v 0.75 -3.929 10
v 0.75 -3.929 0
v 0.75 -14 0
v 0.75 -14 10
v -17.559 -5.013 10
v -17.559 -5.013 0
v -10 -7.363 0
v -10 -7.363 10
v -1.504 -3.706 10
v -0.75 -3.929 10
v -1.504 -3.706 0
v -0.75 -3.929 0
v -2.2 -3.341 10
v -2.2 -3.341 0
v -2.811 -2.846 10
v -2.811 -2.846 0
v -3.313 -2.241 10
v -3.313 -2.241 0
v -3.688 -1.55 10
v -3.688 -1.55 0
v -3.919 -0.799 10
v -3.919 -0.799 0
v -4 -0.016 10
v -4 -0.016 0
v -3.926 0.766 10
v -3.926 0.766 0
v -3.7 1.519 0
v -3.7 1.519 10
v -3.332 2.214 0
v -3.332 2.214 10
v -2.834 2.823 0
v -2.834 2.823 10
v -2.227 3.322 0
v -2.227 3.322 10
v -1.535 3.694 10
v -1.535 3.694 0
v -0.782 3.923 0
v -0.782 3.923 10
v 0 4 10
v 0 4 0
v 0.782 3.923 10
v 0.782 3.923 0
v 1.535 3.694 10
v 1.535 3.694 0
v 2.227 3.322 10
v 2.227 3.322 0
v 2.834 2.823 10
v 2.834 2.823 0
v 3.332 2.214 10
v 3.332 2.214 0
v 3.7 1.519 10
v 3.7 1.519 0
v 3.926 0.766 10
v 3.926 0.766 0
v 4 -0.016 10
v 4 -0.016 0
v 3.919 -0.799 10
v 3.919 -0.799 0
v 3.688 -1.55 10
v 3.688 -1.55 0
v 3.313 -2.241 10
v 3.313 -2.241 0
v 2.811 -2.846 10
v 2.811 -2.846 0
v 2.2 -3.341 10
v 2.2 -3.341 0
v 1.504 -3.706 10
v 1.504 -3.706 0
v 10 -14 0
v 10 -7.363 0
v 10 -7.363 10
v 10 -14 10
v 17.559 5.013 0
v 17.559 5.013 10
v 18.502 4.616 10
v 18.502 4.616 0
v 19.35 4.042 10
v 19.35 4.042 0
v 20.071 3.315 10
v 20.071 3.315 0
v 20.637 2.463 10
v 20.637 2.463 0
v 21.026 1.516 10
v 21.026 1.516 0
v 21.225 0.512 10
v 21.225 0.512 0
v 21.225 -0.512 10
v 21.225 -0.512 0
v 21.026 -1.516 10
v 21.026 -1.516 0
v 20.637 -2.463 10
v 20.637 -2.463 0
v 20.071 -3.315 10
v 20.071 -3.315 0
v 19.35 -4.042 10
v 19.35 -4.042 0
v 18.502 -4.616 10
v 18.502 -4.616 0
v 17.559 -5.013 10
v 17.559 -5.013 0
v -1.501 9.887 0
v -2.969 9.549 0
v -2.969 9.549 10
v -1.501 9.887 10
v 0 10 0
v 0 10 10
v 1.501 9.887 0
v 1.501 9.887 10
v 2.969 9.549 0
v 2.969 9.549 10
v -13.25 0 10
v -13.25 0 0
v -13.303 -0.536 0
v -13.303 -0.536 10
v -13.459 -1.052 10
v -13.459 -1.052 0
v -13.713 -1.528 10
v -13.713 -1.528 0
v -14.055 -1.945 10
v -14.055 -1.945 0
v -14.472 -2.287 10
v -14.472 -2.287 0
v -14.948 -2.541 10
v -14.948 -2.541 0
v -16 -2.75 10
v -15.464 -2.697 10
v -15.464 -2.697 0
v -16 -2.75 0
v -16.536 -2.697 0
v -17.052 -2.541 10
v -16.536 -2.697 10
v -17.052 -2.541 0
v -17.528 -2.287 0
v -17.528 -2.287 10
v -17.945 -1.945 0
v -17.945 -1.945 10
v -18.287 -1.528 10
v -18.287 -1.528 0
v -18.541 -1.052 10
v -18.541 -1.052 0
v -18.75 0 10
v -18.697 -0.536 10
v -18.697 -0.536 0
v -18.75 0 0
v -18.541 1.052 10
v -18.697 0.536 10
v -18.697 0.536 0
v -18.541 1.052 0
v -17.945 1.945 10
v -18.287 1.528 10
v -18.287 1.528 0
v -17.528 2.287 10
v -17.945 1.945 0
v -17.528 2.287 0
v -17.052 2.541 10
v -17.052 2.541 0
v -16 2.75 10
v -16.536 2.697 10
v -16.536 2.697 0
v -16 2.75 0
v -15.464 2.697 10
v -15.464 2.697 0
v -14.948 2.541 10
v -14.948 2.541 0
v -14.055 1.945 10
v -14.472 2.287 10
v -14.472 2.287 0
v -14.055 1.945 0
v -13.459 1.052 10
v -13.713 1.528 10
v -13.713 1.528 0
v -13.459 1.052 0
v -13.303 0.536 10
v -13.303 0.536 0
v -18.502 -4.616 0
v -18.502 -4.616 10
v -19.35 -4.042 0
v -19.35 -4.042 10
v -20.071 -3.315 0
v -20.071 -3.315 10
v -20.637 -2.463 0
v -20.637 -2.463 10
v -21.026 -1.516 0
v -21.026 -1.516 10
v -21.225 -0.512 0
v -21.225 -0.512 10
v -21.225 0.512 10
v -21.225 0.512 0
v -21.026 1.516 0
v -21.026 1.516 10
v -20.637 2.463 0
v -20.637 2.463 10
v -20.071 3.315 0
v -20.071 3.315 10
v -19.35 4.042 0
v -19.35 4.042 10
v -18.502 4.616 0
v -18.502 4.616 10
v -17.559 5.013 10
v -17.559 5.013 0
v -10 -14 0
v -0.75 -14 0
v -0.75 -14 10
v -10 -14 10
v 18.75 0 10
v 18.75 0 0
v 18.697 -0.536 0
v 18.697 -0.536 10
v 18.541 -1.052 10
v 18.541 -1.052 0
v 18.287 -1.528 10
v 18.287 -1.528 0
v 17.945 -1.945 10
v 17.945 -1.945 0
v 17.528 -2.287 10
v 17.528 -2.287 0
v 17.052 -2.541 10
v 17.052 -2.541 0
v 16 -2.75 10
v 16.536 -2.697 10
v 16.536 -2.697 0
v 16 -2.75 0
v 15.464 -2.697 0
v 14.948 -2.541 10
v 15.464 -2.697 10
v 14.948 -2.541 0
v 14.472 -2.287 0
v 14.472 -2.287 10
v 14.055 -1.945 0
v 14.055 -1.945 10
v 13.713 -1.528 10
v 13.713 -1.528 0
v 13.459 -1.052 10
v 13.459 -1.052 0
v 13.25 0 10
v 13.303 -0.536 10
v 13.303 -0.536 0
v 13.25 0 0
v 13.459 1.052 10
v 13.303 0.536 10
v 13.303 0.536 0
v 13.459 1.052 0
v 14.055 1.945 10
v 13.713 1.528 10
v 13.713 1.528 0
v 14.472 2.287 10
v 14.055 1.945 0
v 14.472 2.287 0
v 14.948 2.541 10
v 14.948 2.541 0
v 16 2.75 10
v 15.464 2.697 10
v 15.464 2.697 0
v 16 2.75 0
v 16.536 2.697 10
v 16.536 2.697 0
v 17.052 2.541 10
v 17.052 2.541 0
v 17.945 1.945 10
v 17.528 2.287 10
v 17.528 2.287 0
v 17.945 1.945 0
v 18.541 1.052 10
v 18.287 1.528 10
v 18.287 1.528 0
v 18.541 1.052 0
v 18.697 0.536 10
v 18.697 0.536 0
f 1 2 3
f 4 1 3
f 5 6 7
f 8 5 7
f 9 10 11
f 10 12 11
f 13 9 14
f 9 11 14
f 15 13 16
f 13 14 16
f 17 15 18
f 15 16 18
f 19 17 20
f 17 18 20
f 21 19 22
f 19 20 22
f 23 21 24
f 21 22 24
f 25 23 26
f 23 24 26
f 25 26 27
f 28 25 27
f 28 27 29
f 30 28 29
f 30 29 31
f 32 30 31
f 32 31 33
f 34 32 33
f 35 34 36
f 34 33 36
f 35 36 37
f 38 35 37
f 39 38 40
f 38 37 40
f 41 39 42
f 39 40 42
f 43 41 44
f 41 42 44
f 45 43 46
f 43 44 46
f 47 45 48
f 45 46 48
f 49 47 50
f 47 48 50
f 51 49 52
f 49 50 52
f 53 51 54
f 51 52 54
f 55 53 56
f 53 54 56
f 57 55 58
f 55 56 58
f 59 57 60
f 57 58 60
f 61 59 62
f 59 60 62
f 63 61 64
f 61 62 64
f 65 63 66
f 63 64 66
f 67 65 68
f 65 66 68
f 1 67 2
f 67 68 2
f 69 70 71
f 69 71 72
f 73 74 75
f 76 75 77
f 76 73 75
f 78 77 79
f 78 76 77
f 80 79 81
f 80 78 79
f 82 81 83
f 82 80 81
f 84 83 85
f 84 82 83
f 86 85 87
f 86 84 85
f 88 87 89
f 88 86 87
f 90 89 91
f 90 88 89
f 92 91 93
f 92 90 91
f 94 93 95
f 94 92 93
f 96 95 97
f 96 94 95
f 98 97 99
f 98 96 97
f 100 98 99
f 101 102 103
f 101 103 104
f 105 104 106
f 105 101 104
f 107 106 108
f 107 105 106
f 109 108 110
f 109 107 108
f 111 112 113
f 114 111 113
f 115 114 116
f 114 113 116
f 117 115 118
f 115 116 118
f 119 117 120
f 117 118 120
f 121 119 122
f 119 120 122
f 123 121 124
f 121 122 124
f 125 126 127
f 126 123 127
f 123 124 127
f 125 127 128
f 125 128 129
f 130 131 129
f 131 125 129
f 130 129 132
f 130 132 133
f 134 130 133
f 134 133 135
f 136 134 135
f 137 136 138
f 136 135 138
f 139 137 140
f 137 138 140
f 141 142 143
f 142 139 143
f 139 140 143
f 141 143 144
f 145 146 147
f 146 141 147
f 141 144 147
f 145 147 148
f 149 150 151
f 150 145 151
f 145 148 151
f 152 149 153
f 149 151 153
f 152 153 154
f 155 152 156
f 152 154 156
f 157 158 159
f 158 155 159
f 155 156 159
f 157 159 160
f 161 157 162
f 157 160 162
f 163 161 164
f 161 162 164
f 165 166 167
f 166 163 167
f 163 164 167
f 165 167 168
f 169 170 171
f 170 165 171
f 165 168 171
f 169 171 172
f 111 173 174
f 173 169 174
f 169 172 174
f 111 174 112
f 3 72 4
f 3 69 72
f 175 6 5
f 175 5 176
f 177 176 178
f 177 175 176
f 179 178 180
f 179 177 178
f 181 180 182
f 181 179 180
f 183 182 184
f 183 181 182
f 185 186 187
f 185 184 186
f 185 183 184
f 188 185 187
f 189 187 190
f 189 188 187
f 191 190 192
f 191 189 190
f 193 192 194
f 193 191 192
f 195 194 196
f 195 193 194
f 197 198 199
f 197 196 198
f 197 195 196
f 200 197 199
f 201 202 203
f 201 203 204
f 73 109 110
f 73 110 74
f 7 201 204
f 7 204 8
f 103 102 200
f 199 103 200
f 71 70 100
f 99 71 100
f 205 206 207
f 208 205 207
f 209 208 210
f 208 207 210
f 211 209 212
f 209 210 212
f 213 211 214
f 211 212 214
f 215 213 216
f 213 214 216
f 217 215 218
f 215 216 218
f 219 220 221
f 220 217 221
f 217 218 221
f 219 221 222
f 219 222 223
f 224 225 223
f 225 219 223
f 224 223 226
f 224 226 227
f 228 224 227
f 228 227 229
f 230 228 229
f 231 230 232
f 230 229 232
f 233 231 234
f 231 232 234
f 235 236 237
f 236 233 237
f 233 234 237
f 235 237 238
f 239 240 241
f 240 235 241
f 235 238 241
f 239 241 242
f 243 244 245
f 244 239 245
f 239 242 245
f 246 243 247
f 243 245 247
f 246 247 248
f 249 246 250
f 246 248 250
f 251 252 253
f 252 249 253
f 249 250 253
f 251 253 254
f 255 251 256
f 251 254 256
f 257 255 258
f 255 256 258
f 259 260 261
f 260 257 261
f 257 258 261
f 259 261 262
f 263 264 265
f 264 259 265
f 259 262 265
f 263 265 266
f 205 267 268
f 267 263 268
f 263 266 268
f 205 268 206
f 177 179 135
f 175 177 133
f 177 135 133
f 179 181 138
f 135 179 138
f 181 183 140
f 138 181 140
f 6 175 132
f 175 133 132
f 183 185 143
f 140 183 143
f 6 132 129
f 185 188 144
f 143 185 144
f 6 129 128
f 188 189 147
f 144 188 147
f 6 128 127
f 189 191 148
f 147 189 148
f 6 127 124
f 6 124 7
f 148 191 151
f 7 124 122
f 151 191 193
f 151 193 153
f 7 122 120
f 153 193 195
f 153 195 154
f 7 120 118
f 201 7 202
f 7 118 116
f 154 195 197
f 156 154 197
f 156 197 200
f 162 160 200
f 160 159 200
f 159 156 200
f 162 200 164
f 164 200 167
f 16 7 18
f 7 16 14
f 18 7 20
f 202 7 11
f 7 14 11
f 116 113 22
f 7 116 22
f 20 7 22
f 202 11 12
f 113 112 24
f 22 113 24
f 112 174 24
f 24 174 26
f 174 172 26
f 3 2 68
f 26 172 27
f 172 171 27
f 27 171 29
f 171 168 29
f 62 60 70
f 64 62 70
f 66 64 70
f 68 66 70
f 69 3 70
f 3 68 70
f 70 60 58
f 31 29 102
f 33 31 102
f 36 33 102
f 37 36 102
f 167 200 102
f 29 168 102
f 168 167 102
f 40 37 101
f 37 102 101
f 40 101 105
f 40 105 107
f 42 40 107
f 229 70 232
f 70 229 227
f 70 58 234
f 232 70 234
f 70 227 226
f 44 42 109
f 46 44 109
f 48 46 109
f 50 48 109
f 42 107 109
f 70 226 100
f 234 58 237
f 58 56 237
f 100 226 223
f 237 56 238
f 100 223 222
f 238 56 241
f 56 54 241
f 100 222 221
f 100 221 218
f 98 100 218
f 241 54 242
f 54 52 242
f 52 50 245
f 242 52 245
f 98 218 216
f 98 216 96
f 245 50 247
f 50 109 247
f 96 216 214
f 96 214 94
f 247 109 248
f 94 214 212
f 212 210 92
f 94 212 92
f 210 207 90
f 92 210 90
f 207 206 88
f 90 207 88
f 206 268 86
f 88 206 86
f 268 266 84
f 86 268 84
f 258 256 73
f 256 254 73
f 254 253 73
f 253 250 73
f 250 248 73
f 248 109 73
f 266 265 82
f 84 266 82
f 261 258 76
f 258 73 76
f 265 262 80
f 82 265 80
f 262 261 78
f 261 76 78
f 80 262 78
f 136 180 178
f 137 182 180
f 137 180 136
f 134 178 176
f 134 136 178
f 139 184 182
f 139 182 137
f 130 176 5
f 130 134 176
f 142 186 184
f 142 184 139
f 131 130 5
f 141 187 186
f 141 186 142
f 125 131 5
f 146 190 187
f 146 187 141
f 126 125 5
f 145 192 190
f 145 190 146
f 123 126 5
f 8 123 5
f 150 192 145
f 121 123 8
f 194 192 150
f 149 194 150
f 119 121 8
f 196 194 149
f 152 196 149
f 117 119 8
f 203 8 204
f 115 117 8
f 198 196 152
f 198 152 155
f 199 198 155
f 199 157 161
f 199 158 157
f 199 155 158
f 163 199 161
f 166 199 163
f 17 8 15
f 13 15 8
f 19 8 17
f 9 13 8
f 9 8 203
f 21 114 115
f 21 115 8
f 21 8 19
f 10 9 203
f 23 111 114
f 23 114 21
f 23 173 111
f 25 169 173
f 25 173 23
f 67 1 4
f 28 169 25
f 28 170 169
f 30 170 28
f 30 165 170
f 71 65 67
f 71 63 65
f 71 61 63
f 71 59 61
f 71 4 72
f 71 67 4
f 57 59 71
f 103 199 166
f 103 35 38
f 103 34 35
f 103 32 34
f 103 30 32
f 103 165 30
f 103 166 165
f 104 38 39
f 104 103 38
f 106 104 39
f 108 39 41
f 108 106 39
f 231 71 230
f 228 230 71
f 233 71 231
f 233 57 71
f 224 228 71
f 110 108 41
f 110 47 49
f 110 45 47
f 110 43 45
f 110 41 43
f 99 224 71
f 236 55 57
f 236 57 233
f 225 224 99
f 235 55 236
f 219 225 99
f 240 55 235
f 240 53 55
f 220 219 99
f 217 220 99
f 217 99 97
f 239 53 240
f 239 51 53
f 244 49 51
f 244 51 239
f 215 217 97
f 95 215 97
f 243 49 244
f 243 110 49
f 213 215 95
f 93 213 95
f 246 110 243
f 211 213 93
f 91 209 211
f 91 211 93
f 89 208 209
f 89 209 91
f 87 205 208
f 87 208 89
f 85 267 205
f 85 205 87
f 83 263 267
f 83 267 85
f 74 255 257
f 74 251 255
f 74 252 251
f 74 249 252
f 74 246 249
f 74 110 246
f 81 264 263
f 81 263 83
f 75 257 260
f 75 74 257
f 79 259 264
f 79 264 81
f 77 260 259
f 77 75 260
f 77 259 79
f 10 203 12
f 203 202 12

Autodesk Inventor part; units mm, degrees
ref_plane "YZ Plane" through (0, 0, 0) normal (1, 0, 0) x (0, 1, 0)
ref_plane "XZ Plane" through (0, 0, 0) normal (0, 1, 0) x (-1, 0, 0)
ref_plane "XY Plane" through (0, 0, 0) normal (0, 0, 1) x (1, 0, 0)
sketch "Sketch1" plane through (0, 0, 0) normal (0, 0, 1) x (1, 0, 0)
  circle A0 centre (-16, 0) radius 2.75
  circle A1 centre (16, 0) radius 2.75
  circle A2 centre (0, 0) radius 4
  circle A3 centre (-16, 0) radius 5.25
  circle A4 centre (16, 0) radius 5.25
  circle A5 centre (0, 0) radius 10
  line L0 (-2.9687, 9.5492) -> (-17.5586, 5.0133)
  line L1 (2.9687, 9.5492) -> (17.5586, 5.0133)
  line L2 (-17.5586, -5.0133) -> (-2.9688, -9.5492)
  line L3 (2.9687, -9.5492) -> (17.5586, -5.0133)
  line L4 (-10, 3.0548) -> (10, 3.0548)
  line L5 (10, 3.0548) -> (10, -14)
  line L6 (10, -14) -> (-10, -14)
  line L7 (-10, -14) -> (-10, 3.0548)
  line L8 (-0.75, 0) -> (0.75, 0)
  line L9 (0.75, 0) -> (0.75, -14)
  line L10 (0.75, -14) -> (-0.75, -14)
  line L11 (-0.75, -14) -> (-0.75, 0)
  point P0 (-9.522, 3.0548)
  point P1 (-10, 0)
  point P2 (-10, -7.3632)
  point P3 (-0.75, -3.9291)
  point P4 (0.75, -3.9291)
  point P5 (10, -7.3632)
  point P6 (9.522, 3.0548)
  point P7 (10, 0)
  dimension "d0" = 5.5
  dimension "d1" = 5.5
  dimension "d2" = 32
  dimension "d3" = 16
  dimension "d4" = 8
  dimension "d5" = 10.5
  dimension "d6" = 10.5
  dimension "d7" = 20
  dimension "d8" = 0
  dimension "d9" = 0
  dimension "d10" = 14
  dimension "d11" = 20
  dimension "d12" = 10
  dimension "d13" = 1.5
  dimension "d14" = 0.75
extrude "Extrusion1" add sketch "Sketch1" along normal blind 10 contours A2 L4 A5 L9 | A2 L4 A5 | A2 L11 A5 L4 | L4 L5 A5 | A5 L1 A4 L3 L5 L4 | A5 L3 L5 L6 L9 | L4 L7 L2 A3 L0 A5 | A5 L7 L4 | L5 L3 A5 | L11 L6 L7 L2 A5 | A5 L2 L7 | A4 | A3
properties part number "SHF08"
